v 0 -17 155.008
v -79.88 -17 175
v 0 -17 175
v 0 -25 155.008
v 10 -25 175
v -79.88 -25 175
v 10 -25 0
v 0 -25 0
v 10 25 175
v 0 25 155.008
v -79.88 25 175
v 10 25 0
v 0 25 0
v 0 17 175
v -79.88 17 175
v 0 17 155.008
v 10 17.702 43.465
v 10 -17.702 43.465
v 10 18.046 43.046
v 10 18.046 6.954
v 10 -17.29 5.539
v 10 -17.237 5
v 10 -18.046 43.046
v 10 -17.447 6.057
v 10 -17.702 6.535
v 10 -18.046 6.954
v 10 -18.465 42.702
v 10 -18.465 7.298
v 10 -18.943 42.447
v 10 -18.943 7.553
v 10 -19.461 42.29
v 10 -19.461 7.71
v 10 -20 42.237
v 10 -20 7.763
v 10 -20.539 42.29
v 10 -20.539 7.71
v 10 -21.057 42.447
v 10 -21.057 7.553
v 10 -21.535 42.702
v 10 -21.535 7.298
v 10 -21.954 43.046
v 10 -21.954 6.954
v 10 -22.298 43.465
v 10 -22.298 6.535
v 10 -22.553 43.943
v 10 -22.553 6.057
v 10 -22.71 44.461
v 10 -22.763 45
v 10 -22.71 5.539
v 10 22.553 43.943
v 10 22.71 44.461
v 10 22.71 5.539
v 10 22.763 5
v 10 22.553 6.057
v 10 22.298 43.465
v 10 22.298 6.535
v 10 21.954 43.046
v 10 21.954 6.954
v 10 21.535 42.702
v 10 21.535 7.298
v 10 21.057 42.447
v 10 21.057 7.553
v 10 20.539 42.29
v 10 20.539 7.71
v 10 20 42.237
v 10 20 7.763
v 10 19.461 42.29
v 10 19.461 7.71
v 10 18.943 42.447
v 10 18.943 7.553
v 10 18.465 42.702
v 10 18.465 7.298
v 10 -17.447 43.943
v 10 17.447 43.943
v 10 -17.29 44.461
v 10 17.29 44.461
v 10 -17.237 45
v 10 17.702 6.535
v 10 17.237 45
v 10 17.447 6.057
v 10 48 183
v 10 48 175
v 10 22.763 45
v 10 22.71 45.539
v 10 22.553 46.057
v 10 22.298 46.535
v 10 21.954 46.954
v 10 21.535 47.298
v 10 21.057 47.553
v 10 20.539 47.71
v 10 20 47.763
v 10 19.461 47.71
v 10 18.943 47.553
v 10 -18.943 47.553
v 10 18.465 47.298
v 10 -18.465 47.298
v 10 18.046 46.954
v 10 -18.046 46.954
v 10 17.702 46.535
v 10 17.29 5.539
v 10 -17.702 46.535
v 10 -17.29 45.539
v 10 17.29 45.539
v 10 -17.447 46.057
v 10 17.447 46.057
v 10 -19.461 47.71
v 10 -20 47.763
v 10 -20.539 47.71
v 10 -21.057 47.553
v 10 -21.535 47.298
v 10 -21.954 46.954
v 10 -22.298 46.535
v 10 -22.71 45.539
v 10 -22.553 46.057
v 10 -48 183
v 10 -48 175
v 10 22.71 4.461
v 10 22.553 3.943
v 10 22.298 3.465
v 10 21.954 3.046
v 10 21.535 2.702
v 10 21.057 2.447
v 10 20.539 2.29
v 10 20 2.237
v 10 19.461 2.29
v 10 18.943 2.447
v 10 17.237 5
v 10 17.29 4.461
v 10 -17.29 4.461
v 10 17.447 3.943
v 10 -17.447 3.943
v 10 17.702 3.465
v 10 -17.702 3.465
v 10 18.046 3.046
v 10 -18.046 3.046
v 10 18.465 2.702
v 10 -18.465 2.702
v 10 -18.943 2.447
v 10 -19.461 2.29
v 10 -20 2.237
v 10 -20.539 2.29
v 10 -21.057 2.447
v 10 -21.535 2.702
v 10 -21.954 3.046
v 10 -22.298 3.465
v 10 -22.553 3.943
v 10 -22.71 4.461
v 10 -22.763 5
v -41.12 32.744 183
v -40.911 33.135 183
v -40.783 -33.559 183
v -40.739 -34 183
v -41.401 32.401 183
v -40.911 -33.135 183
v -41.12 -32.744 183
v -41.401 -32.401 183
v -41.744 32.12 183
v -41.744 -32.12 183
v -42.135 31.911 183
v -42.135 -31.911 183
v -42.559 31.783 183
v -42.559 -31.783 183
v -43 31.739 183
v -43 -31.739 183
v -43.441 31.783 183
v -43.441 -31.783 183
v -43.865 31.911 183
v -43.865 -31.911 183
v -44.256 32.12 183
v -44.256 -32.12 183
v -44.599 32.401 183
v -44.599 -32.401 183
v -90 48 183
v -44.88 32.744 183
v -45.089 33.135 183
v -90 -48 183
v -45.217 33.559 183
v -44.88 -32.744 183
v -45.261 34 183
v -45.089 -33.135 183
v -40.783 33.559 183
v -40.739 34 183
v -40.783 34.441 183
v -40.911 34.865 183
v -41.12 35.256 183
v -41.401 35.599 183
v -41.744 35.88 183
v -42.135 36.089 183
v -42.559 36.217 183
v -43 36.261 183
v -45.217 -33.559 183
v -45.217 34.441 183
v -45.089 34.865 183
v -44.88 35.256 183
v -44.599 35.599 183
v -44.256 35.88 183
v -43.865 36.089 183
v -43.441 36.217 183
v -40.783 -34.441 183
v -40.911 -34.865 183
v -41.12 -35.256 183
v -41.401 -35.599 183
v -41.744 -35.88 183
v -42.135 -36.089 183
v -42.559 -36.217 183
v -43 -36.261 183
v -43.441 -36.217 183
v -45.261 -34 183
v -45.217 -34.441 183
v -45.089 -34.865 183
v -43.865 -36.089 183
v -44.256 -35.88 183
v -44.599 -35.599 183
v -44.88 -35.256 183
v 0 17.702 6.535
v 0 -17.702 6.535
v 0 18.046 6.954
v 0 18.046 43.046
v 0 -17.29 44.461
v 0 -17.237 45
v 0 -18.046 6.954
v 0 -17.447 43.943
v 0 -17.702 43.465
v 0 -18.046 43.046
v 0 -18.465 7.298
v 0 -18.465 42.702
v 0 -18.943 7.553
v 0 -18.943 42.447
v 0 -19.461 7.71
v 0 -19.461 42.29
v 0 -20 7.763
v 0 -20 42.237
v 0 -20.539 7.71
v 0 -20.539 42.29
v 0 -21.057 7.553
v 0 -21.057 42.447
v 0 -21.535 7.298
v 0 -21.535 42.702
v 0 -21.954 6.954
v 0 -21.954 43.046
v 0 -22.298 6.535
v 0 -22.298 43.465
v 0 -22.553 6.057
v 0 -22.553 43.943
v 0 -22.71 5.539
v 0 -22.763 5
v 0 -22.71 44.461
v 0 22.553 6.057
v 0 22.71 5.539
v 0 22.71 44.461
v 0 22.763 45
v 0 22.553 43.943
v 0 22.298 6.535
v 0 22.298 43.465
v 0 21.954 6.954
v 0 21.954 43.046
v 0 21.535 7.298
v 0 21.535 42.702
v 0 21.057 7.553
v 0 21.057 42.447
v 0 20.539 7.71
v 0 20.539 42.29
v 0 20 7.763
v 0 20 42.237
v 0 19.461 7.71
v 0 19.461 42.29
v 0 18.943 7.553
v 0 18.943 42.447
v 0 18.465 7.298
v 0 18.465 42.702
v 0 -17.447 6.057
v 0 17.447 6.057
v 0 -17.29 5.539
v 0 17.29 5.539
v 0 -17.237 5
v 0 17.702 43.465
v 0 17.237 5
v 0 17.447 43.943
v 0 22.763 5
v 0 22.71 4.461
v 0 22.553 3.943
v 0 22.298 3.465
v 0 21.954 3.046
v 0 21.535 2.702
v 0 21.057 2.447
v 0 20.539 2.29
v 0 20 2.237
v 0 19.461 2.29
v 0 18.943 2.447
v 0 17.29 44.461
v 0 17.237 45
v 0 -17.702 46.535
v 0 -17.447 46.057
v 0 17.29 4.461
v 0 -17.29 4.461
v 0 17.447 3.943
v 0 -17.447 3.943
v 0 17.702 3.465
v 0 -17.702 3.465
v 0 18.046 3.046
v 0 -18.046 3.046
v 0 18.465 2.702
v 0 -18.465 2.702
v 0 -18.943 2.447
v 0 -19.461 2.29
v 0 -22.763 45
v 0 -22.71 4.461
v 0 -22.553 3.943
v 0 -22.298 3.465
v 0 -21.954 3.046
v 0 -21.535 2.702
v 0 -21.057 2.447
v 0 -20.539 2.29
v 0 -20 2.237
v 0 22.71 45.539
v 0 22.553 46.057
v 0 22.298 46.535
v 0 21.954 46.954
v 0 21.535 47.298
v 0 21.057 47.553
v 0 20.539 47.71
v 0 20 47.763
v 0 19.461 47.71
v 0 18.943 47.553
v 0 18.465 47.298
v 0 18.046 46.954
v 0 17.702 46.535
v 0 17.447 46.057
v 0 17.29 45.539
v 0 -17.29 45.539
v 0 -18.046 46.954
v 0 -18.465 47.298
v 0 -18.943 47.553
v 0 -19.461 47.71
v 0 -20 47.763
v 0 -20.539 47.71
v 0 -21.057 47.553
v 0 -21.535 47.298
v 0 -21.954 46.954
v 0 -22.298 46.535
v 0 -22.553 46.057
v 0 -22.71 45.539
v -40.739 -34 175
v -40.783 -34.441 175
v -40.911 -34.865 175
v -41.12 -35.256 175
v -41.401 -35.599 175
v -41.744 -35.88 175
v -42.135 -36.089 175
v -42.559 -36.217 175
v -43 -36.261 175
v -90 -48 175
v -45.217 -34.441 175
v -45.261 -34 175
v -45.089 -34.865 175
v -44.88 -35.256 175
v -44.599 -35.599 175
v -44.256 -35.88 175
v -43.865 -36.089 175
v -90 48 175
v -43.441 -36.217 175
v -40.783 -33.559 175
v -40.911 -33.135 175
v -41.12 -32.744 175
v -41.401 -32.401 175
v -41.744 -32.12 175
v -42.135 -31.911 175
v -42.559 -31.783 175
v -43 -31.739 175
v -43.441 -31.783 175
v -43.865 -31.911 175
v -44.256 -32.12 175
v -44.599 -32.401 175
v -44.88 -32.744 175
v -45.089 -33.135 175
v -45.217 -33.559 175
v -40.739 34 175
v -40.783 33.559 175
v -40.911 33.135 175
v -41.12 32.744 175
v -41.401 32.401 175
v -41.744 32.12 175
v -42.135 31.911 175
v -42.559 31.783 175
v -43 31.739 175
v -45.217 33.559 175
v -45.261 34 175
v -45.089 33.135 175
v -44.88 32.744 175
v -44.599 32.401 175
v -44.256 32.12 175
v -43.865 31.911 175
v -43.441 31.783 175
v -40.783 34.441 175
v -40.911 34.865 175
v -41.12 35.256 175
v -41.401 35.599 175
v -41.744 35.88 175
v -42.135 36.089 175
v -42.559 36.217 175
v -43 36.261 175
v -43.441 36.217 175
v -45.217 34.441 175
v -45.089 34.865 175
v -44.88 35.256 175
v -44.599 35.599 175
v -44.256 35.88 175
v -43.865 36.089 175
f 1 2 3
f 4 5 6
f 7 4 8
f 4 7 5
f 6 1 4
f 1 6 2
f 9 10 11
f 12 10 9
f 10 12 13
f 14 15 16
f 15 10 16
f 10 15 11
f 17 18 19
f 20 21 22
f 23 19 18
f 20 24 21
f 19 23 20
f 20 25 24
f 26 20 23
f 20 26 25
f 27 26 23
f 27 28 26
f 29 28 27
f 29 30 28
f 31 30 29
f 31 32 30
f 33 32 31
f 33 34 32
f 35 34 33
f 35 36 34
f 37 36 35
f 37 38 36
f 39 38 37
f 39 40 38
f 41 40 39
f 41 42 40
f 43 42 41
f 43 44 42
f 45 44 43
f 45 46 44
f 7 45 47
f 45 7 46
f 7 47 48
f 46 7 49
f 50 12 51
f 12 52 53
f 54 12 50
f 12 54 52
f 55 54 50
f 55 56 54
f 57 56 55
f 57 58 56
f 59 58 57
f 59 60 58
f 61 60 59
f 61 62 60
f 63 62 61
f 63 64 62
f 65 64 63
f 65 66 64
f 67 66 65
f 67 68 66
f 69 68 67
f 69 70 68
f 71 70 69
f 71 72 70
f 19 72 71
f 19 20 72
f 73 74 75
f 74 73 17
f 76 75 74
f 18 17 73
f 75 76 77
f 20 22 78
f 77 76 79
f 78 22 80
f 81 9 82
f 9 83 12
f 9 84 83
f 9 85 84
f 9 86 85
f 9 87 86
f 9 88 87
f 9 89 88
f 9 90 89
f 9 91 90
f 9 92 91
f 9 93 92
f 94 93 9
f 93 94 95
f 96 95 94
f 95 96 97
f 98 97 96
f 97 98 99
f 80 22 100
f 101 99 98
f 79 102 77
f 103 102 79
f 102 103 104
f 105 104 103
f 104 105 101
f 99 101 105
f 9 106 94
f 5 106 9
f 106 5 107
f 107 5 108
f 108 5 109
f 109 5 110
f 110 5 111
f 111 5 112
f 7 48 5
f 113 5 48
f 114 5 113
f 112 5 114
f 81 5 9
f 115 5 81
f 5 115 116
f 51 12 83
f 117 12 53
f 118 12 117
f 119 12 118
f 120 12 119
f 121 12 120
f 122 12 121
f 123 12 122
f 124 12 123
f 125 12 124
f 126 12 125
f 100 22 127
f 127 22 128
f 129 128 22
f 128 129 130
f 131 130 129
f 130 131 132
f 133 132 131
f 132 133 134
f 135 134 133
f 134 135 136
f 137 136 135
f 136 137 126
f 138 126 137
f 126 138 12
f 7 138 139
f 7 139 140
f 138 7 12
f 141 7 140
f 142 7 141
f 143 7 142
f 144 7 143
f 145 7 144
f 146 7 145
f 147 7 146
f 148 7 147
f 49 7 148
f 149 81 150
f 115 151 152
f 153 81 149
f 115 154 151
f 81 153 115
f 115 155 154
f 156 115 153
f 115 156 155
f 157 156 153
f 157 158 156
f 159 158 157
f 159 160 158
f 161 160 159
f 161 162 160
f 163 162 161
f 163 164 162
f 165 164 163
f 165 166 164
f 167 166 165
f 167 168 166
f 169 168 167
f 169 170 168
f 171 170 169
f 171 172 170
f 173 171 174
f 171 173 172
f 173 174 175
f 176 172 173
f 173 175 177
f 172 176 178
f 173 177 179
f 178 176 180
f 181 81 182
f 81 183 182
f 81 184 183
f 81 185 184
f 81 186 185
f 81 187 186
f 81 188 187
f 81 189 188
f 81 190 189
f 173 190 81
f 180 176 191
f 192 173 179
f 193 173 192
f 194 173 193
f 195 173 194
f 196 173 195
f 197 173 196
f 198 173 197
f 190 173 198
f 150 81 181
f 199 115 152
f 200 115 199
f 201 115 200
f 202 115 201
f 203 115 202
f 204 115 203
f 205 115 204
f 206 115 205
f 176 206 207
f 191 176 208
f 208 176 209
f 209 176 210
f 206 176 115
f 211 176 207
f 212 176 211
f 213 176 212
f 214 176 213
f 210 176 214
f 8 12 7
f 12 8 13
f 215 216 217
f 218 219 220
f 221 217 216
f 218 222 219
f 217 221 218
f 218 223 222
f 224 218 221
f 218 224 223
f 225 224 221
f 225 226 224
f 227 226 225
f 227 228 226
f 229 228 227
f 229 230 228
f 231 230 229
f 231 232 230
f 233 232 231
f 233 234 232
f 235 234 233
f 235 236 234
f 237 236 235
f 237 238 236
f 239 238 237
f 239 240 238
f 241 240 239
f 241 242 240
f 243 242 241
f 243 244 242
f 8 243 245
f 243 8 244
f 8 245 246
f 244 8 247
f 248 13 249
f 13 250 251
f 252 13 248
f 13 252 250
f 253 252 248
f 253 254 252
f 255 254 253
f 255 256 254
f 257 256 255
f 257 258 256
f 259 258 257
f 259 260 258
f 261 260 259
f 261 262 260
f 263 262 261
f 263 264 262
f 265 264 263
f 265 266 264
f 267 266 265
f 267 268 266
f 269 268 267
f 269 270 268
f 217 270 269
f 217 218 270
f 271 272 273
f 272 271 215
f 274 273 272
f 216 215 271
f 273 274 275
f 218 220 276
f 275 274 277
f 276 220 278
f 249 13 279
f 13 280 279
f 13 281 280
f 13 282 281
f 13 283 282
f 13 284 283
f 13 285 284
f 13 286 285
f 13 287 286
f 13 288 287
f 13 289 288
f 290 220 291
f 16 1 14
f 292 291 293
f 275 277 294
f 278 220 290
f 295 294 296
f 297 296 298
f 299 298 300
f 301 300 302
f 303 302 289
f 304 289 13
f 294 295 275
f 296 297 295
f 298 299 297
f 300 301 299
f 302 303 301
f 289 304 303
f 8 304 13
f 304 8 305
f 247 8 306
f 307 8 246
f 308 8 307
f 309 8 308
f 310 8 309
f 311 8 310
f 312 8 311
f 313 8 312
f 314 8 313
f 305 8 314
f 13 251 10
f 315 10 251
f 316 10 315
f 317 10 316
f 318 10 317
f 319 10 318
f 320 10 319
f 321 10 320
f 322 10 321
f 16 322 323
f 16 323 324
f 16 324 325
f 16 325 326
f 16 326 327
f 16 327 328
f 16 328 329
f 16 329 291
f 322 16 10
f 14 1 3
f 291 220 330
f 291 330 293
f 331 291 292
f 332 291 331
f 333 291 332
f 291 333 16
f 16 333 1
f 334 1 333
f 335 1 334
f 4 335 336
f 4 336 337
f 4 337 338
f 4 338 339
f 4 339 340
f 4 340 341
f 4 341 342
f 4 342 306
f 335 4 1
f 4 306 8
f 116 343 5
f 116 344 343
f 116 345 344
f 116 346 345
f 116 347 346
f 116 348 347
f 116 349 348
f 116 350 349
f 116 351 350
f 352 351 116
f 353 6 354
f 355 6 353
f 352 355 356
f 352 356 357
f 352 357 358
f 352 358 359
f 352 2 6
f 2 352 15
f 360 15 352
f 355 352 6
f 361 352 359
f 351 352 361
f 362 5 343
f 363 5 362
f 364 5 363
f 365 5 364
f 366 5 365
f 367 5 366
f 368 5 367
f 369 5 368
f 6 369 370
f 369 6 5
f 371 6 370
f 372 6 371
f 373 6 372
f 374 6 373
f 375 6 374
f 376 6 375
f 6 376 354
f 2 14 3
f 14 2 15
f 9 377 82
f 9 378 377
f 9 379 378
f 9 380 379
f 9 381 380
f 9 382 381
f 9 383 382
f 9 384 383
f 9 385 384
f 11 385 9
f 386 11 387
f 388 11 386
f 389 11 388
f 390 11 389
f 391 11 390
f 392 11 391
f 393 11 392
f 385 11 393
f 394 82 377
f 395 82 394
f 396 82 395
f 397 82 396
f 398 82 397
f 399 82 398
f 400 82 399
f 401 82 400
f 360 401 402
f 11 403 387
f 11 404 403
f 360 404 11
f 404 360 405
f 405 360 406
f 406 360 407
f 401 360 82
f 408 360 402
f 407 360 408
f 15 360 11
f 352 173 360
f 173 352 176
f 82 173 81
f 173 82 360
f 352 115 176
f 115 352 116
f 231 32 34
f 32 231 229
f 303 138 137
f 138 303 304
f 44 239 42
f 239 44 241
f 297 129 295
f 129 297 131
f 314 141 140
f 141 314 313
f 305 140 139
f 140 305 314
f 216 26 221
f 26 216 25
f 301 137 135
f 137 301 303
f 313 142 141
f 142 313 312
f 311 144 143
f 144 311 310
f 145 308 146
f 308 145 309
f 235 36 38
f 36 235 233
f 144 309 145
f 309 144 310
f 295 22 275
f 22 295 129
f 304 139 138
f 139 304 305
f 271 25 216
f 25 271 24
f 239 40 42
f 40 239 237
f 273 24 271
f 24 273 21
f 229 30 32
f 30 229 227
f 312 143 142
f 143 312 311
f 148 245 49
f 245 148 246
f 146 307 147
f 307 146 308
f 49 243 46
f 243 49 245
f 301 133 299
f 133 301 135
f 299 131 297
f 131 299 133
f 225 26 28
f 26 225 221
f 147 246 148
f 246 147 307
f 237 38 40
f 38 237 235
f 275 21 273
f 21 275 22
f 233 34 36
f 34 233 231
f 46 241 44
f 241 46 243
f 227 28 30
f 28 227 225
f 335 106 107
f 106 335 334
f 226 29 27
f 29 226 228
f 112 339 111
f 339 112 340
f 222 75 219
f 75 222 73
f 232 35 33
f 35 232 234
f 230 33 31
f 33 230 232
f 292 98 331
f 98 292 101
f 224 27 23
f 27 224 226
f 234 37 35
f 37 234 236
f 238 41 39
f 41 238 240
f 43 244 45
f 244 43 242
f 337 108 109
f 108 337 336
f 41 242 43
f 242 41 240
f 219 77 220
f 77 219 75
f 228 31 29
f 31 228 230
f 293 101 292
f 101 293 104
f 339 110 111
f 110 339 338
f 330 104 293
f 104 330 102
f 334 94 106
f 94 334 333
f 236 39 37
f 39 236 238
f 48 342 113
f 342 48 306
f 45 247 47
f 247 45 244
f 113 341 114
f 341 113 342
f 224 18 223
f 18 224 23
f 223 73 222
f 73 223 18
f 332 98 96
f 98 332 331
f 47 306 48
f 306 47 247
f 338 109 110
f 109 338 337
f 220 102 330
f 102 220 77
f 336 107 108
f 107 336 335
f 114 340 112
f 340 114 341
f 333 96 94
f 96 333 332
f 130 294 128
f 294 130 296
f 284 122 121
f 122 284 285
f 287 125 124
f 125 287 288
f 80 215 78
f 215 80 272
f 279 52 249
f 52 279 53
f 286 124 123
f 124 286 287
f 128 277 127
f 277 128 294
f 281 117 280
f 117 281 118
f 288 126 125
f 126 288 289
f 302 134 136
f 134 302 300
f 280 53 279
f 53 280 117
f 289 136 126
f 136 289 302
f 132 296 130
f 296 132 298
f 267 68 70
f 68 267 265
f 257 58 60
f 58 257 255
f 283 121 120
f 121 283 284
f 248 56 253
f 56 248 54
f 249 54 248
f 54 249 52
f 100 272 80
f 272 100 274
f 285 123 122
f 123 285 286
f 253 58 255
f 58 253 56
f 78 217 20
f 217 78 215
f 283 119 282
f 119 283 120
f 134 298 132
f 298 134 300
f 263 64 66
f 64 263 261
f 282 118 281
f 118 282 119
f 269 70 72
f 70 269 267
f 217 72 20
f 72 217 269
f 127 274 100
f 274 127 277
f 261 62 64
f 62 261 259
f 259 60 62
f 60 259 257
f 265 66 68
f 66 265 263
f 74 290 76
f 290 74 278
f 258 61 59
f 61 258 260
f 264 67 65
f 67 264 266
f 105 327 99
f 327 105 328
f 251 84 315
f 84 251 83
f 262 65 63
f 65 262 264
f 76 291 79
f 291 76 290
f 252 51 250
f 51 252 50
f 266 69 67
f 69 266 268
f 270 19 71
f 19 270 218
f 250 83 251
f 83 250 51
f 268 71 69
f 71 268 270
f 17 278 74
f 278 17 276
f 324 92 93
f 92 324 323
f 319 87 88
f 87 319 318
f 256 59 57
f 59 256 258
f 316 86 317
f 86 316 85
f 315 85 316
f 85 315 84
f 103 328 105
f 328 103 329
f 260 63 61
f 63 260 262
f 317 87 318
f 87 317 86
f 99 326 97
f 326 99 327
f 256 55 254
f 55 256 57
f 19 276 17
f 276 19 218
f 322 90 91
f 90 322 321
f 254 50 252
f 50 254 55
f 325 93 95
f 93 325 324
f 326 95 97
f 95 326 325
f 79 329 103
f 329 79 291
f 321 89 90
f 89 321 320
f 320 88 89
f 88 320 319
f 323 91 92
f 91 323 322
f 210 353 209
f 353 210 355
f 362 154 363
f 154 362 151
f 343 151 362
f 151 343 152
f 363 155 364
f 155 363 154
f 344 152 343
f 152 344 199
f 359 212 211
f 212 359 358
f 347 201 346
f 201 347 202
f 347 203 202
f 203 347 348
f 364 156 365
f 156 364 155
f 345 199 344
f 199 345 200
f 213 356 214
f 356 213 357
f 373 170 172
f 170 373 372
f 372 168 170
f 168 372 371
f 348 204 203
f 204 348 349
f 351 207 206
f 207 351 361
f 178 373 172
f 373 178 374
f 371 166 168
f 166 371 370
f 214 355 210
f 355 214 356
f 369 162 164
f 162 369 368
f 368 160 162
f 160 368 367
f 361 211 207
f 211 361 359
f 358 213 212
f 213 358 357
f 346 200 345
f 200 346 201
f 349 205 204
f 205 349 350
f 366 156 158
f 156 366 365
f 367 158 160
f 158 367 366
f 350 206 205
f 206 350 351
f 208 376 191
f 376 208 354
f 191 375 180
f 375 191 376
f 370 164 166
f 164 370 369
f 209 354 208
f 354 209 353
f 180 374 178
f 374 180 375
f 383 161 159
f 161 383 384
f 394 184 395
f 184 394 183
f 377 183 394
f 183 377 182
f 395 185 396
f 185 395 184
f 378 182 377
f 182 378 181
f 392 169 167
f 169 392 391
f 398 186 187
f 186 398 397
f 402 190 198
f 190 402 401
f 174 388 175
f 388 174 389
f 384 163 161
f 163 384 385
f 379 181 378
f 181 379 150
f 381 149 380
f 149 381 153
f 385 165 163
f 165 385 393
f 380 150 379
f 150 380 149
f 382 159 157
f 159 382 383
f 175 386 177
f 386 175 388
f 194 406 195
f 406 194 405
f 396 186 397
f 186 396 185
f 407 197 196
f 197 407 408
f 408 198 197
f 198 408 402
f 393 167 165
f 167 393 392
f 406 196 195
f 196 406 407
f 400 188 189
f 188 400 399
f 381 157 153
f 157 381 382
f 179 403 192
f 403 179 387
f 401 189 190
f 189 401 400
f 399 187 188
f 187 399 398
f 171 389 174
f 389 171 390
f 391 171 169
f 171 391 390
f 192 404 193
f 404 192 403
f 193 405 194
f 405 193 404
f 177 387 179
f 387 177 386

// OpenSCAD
// file: ../../../../../scad/lib/parent_spar_bolted.scad
// Parent modular exterior v2. mm. Geometry shared by individual part wrappers.
// Metal fasteners, ballast, Takachi box and electronics are purchased items.
/* [Dimensions] */
disk_d=225; disk_t=5;
fin_h=125; fin_w=65; fin_t=4;
beam_w=32; clearance=0.5;
float_r=100; flange_r=112.5; float_bore_r=30;
float_wall=4; float_h=180; lid_t=6;
rod_r=105.5; flange_t=6;
hub_h=32; root_x=30; root_depth=14;
$fn=96; e=0.03;
assert(disk_d<=225 && 2*flange_r<=225);
assert(fin_h>=100 && fin_h<=150 && fin_w>=50 && fin_w<=80);
assert(root_x+fin_w<disk_d/2-5);
module bore(d,h) { cylinder(d=d/cos(180/32),h=h,$fn=32); }
module bore_x(d,l) { rotate([0,90,0]) bore(d,l); }
module bore_y(d,l) { rotate([-90,0,0]) bore(d,l); }
module square_bore(h) { translate([-(beam_w+clearance)/2,-(beam_w+clearance)/2,-e]) cube([beam_w+clearance,beam_w+clearance,h+2*e]); }
module rods(h,d=6.5) { for(a=[45:90:315]) rotate([0,0,a]) translate([rod_r,0,-e]) bore(d,h+2*e); }
module lid_bolts(h) { for(a=[22.5:45:359]) rotate([0,0,a]) translate([rod_r,0,-e]) bore(4.5,h+2*e); }
module hub_pin(z) { translate([-46,10,z]) bore_x(6.5,92); }
module disk() {
 difference() { cylinder(d=disk_d,h=disk_t); square_bore(disk_t);
  for(x=[-23,23],y=[-23,23]) translate([x,y,-e]) bore(5.5,disk_t+2*e);
 }
}
module fin() {
 difference() { cube([fin_w,fin_t,fin_h]);
  for(z=[10,fin_h-hub_h+10]) translate([root_depth/2,-e,z]) bore_y(5.5,fin_t+2*e);
 }
}
module hub() {
 difference() {
  union() { translate([-30,-30,0]) cube([60,60,hub_h]);
   for(a=[0:90:270]) rotate([0,0,a]) translate([28,-16,0]) cube([16,32,hub_h]);
  }
  square_bore(hub_h);
  for(a=[0:90:270]) rotate([0,0,a]) {
   translate([root_x-clearance/2,-(fin_t+clearance)/2,-e]) cube([root_depth+clearance,fin_t+clearance,hub_h+2*e]);
   translate([root_x+root_depth/2,-17,10]) bore_y(5.5,34);
  }
  for(x=[-23,23],y=[-23,23]) translate([x,y,-e]) bore(5.5,hub_h+2*e);
  hub_pin(24);
 }
}
module beam(lower=true) {
 len=lower?180:107;
 difference() { translate([-beam_w/2,-beam_w/2,0]) cube([beam_w,beam_w,len]);
  if(lower) { for(z=[24,117]) hub_pin(z); translate([-20,0,160]) bore_x(6.5,40); translate([0,0,-e]) bore(16,8); }
  else for(z=[20,87]) translate([-20,0,z]) bore_x(6.5,40);
 }
}
module coupler() {
 // One half of a screwed split coupler. Mirror Y for the second half.
 difference() { translate([-27,0.25,0]) cube([54,26.75,64]); square_bore(64);
  for(z=[12,52]) translate([-28,0,z]) bore_x(6.5,56);
  for(x=[-22,22],z=[24,40]) translate([x,-1,z]) bore_y(5.5,29);
 }
}
module float_body() {
 difference() {
  union() { cylinder(r=float_r,h=float_h);
   translate([0,0,float_h-flange_t]) cylinder(r=flange_r,h=flange_t);
   // 45-degree underside of the flange instead of a 15 mm unsupported ledge.
   translate([0,0,float_h-flange_t-(flange_r-float_r)]) cylinder(r1=float_r,r2=flange_r,h=flange_r-float_r);
  }
  translate([0,0,-e]) cylinder(r=float_bore_r,h=float_h+2*e);
  translate([0,0,float_wall]) difference() {
   cylinder(r=float_r-float_wall,h=float_h);
   cylinder(r=float_bore_r+float_wall,h=float_h+e);
  }
  // Coupling-nut clearance; nearest cavity wall remains >=3 mm thick.
  rods(float_h,13); lid_bolts(float_h);
  for(a=[22.5:45:359]) rotate([0,0,a]) translate([rod_r,0,-e]) bore(10,float_h-flange_t+e);
 }
}
module float_lid() {
 difference() {
  cylinder(r=flange_r,h=lid_t);
  translate([0,0,-e]) cylinder(r=float_bore_r,h=lid_t+2*e);
  rods(lid_t,13); lid_bolts(lid_t);
  // Continuous face seals: 2 mm cord, 2.4 wide x 1.5 deep grooves.
  for(r=[float_bore_r+float_wall/2,float_r-float_wall/2]) translate([0,0,-e]) difference() {
   cylinder(r=r+1.2,h=1.5+e); cylinder(r=r-1.2,h=1.5+2*e);
  }
 }
}
module float_end(top=true) {
 difference() {
  union() { cylinder(r=flange_r,h=8);
   if(top) translate([-30,-30,8-e]) cube([60,60,20+e]);
   else translate([-23,-23,-40]) cube([46,46,40+e]);
  }
  rods(8);
  if(top) for(x=[-20,20],y=[-20,20]) {
   translate([x,y,-e]) bore(5.5,29);
   translate([x,y,-e]) bore(11,18+e);
  }
  if(top) for(a=[22.5:45:359]) rotate([0,0,a]) translate([rod_r,0,-e]) bore(12,8+2*e);
  else { translate([0,0,-40]) square_bore(40-e);
   translate([-24,0,-20]) bore_x(6.5,48);
  }
 }
}
module ballast_body() {
 // Open upward in print orientation. In the assembly this cup is inverted.
 difference() {
  union() { cylinder(r=45,h=51); translate([0,0,45]) cylinder(r=60,h=6);
   translate([0,0,30]) cylinder(r1=45,r2=60,h=15);
  }
  translate([0,0,6]) cylinder(r=40,h=46);
  for(x=[-23,23],y=[-23,23]) translate([x,y,-e]) bore(5.5,7);
  translate([0,0,-e]) bore(8.5,7);
  for(a=[0:90:270]) rotate([0,0,a]) translate([52,0,29]) { bore(5.5,23); bore(12,16); }
 }
}
module ballast_lid() {
 difference() { cylinder(r=60,h=6);
  for(a=[0:90:270]) rotate([0,0,a]) translate([52,0,-e]) bore(5.5,7);
  // Flooded ballast compartment: drainage, no trapped air assumption.
  for(x=[-20,0,20]) translate([x,0,-e]) bore(6,7);
 }
}
module camera_bridge() {
 // Assembly frame: local top z=78; camera seat z=8. +Y faces camera front.
 difference() {
  union() {
   translate([-30,45,70]) cube([60,90,8]);
   translate([-70,125,0]) cube([140,100,8]);
   translate([-70,125,0]) cube([140,10,78]);
   for(x=[-64,56]) translate([x,0,0]) rotate([90,0,90]) linear_extrude(8)
    polygon([[135,8],[215,8],[135,70]]);
  }
  for(x=[-20,20],y=[50,90]) translate([x,y,69]) bore(5.5,10);
  for(x=[-11,11],y=[174,206]) translate([x,y,-e]) bore(5.5,10);
 }
}
module gps_bridge() {
 // Local attachment face X=0 at deck +X; top shelf z=175.
 difference() {
  union() { translate([0,-25,0]) cube([10,50,183]);
   translate([-90,-48,175]) cube([100,96,8]);
   for(y=[-17,25]) translate([0,y,0]) rotate([90,0,0]) linear_extrude(8)
    polygon([[e,155],[e,175+e],[-80,175+e]]);
  }
  for(y=[-20,20],z=[5,45]) translate([-e,y,z]) bore_x(5.5,11);
  for(y=[-34,34]) translate([-43,y,174]) bore(4.5,10);
 }
}
// Reference antenna envelope, correct mounting ears, not a printable antenna.
module gps_reference() {
 difference() {
  union() { translate([-30,-28,0]) cube([60,56,22.5]);
   translate([-10,-41,0]) cube([20,82,6]); }
  for(y=[-34,34]) translate([0,y,-e]) bore(4.5,7);
 }
}
// main file
// mm. part=print is the intended X1C orientation.
part="assembly"; // [assembly,print]
use <../../../../../scad/lib/parent_spar_bolted.scad>
if(part=="print") { translate([0,0,10]) rotate([0,90,0]) gps_bridge(); } else { gps_bridge(); }
